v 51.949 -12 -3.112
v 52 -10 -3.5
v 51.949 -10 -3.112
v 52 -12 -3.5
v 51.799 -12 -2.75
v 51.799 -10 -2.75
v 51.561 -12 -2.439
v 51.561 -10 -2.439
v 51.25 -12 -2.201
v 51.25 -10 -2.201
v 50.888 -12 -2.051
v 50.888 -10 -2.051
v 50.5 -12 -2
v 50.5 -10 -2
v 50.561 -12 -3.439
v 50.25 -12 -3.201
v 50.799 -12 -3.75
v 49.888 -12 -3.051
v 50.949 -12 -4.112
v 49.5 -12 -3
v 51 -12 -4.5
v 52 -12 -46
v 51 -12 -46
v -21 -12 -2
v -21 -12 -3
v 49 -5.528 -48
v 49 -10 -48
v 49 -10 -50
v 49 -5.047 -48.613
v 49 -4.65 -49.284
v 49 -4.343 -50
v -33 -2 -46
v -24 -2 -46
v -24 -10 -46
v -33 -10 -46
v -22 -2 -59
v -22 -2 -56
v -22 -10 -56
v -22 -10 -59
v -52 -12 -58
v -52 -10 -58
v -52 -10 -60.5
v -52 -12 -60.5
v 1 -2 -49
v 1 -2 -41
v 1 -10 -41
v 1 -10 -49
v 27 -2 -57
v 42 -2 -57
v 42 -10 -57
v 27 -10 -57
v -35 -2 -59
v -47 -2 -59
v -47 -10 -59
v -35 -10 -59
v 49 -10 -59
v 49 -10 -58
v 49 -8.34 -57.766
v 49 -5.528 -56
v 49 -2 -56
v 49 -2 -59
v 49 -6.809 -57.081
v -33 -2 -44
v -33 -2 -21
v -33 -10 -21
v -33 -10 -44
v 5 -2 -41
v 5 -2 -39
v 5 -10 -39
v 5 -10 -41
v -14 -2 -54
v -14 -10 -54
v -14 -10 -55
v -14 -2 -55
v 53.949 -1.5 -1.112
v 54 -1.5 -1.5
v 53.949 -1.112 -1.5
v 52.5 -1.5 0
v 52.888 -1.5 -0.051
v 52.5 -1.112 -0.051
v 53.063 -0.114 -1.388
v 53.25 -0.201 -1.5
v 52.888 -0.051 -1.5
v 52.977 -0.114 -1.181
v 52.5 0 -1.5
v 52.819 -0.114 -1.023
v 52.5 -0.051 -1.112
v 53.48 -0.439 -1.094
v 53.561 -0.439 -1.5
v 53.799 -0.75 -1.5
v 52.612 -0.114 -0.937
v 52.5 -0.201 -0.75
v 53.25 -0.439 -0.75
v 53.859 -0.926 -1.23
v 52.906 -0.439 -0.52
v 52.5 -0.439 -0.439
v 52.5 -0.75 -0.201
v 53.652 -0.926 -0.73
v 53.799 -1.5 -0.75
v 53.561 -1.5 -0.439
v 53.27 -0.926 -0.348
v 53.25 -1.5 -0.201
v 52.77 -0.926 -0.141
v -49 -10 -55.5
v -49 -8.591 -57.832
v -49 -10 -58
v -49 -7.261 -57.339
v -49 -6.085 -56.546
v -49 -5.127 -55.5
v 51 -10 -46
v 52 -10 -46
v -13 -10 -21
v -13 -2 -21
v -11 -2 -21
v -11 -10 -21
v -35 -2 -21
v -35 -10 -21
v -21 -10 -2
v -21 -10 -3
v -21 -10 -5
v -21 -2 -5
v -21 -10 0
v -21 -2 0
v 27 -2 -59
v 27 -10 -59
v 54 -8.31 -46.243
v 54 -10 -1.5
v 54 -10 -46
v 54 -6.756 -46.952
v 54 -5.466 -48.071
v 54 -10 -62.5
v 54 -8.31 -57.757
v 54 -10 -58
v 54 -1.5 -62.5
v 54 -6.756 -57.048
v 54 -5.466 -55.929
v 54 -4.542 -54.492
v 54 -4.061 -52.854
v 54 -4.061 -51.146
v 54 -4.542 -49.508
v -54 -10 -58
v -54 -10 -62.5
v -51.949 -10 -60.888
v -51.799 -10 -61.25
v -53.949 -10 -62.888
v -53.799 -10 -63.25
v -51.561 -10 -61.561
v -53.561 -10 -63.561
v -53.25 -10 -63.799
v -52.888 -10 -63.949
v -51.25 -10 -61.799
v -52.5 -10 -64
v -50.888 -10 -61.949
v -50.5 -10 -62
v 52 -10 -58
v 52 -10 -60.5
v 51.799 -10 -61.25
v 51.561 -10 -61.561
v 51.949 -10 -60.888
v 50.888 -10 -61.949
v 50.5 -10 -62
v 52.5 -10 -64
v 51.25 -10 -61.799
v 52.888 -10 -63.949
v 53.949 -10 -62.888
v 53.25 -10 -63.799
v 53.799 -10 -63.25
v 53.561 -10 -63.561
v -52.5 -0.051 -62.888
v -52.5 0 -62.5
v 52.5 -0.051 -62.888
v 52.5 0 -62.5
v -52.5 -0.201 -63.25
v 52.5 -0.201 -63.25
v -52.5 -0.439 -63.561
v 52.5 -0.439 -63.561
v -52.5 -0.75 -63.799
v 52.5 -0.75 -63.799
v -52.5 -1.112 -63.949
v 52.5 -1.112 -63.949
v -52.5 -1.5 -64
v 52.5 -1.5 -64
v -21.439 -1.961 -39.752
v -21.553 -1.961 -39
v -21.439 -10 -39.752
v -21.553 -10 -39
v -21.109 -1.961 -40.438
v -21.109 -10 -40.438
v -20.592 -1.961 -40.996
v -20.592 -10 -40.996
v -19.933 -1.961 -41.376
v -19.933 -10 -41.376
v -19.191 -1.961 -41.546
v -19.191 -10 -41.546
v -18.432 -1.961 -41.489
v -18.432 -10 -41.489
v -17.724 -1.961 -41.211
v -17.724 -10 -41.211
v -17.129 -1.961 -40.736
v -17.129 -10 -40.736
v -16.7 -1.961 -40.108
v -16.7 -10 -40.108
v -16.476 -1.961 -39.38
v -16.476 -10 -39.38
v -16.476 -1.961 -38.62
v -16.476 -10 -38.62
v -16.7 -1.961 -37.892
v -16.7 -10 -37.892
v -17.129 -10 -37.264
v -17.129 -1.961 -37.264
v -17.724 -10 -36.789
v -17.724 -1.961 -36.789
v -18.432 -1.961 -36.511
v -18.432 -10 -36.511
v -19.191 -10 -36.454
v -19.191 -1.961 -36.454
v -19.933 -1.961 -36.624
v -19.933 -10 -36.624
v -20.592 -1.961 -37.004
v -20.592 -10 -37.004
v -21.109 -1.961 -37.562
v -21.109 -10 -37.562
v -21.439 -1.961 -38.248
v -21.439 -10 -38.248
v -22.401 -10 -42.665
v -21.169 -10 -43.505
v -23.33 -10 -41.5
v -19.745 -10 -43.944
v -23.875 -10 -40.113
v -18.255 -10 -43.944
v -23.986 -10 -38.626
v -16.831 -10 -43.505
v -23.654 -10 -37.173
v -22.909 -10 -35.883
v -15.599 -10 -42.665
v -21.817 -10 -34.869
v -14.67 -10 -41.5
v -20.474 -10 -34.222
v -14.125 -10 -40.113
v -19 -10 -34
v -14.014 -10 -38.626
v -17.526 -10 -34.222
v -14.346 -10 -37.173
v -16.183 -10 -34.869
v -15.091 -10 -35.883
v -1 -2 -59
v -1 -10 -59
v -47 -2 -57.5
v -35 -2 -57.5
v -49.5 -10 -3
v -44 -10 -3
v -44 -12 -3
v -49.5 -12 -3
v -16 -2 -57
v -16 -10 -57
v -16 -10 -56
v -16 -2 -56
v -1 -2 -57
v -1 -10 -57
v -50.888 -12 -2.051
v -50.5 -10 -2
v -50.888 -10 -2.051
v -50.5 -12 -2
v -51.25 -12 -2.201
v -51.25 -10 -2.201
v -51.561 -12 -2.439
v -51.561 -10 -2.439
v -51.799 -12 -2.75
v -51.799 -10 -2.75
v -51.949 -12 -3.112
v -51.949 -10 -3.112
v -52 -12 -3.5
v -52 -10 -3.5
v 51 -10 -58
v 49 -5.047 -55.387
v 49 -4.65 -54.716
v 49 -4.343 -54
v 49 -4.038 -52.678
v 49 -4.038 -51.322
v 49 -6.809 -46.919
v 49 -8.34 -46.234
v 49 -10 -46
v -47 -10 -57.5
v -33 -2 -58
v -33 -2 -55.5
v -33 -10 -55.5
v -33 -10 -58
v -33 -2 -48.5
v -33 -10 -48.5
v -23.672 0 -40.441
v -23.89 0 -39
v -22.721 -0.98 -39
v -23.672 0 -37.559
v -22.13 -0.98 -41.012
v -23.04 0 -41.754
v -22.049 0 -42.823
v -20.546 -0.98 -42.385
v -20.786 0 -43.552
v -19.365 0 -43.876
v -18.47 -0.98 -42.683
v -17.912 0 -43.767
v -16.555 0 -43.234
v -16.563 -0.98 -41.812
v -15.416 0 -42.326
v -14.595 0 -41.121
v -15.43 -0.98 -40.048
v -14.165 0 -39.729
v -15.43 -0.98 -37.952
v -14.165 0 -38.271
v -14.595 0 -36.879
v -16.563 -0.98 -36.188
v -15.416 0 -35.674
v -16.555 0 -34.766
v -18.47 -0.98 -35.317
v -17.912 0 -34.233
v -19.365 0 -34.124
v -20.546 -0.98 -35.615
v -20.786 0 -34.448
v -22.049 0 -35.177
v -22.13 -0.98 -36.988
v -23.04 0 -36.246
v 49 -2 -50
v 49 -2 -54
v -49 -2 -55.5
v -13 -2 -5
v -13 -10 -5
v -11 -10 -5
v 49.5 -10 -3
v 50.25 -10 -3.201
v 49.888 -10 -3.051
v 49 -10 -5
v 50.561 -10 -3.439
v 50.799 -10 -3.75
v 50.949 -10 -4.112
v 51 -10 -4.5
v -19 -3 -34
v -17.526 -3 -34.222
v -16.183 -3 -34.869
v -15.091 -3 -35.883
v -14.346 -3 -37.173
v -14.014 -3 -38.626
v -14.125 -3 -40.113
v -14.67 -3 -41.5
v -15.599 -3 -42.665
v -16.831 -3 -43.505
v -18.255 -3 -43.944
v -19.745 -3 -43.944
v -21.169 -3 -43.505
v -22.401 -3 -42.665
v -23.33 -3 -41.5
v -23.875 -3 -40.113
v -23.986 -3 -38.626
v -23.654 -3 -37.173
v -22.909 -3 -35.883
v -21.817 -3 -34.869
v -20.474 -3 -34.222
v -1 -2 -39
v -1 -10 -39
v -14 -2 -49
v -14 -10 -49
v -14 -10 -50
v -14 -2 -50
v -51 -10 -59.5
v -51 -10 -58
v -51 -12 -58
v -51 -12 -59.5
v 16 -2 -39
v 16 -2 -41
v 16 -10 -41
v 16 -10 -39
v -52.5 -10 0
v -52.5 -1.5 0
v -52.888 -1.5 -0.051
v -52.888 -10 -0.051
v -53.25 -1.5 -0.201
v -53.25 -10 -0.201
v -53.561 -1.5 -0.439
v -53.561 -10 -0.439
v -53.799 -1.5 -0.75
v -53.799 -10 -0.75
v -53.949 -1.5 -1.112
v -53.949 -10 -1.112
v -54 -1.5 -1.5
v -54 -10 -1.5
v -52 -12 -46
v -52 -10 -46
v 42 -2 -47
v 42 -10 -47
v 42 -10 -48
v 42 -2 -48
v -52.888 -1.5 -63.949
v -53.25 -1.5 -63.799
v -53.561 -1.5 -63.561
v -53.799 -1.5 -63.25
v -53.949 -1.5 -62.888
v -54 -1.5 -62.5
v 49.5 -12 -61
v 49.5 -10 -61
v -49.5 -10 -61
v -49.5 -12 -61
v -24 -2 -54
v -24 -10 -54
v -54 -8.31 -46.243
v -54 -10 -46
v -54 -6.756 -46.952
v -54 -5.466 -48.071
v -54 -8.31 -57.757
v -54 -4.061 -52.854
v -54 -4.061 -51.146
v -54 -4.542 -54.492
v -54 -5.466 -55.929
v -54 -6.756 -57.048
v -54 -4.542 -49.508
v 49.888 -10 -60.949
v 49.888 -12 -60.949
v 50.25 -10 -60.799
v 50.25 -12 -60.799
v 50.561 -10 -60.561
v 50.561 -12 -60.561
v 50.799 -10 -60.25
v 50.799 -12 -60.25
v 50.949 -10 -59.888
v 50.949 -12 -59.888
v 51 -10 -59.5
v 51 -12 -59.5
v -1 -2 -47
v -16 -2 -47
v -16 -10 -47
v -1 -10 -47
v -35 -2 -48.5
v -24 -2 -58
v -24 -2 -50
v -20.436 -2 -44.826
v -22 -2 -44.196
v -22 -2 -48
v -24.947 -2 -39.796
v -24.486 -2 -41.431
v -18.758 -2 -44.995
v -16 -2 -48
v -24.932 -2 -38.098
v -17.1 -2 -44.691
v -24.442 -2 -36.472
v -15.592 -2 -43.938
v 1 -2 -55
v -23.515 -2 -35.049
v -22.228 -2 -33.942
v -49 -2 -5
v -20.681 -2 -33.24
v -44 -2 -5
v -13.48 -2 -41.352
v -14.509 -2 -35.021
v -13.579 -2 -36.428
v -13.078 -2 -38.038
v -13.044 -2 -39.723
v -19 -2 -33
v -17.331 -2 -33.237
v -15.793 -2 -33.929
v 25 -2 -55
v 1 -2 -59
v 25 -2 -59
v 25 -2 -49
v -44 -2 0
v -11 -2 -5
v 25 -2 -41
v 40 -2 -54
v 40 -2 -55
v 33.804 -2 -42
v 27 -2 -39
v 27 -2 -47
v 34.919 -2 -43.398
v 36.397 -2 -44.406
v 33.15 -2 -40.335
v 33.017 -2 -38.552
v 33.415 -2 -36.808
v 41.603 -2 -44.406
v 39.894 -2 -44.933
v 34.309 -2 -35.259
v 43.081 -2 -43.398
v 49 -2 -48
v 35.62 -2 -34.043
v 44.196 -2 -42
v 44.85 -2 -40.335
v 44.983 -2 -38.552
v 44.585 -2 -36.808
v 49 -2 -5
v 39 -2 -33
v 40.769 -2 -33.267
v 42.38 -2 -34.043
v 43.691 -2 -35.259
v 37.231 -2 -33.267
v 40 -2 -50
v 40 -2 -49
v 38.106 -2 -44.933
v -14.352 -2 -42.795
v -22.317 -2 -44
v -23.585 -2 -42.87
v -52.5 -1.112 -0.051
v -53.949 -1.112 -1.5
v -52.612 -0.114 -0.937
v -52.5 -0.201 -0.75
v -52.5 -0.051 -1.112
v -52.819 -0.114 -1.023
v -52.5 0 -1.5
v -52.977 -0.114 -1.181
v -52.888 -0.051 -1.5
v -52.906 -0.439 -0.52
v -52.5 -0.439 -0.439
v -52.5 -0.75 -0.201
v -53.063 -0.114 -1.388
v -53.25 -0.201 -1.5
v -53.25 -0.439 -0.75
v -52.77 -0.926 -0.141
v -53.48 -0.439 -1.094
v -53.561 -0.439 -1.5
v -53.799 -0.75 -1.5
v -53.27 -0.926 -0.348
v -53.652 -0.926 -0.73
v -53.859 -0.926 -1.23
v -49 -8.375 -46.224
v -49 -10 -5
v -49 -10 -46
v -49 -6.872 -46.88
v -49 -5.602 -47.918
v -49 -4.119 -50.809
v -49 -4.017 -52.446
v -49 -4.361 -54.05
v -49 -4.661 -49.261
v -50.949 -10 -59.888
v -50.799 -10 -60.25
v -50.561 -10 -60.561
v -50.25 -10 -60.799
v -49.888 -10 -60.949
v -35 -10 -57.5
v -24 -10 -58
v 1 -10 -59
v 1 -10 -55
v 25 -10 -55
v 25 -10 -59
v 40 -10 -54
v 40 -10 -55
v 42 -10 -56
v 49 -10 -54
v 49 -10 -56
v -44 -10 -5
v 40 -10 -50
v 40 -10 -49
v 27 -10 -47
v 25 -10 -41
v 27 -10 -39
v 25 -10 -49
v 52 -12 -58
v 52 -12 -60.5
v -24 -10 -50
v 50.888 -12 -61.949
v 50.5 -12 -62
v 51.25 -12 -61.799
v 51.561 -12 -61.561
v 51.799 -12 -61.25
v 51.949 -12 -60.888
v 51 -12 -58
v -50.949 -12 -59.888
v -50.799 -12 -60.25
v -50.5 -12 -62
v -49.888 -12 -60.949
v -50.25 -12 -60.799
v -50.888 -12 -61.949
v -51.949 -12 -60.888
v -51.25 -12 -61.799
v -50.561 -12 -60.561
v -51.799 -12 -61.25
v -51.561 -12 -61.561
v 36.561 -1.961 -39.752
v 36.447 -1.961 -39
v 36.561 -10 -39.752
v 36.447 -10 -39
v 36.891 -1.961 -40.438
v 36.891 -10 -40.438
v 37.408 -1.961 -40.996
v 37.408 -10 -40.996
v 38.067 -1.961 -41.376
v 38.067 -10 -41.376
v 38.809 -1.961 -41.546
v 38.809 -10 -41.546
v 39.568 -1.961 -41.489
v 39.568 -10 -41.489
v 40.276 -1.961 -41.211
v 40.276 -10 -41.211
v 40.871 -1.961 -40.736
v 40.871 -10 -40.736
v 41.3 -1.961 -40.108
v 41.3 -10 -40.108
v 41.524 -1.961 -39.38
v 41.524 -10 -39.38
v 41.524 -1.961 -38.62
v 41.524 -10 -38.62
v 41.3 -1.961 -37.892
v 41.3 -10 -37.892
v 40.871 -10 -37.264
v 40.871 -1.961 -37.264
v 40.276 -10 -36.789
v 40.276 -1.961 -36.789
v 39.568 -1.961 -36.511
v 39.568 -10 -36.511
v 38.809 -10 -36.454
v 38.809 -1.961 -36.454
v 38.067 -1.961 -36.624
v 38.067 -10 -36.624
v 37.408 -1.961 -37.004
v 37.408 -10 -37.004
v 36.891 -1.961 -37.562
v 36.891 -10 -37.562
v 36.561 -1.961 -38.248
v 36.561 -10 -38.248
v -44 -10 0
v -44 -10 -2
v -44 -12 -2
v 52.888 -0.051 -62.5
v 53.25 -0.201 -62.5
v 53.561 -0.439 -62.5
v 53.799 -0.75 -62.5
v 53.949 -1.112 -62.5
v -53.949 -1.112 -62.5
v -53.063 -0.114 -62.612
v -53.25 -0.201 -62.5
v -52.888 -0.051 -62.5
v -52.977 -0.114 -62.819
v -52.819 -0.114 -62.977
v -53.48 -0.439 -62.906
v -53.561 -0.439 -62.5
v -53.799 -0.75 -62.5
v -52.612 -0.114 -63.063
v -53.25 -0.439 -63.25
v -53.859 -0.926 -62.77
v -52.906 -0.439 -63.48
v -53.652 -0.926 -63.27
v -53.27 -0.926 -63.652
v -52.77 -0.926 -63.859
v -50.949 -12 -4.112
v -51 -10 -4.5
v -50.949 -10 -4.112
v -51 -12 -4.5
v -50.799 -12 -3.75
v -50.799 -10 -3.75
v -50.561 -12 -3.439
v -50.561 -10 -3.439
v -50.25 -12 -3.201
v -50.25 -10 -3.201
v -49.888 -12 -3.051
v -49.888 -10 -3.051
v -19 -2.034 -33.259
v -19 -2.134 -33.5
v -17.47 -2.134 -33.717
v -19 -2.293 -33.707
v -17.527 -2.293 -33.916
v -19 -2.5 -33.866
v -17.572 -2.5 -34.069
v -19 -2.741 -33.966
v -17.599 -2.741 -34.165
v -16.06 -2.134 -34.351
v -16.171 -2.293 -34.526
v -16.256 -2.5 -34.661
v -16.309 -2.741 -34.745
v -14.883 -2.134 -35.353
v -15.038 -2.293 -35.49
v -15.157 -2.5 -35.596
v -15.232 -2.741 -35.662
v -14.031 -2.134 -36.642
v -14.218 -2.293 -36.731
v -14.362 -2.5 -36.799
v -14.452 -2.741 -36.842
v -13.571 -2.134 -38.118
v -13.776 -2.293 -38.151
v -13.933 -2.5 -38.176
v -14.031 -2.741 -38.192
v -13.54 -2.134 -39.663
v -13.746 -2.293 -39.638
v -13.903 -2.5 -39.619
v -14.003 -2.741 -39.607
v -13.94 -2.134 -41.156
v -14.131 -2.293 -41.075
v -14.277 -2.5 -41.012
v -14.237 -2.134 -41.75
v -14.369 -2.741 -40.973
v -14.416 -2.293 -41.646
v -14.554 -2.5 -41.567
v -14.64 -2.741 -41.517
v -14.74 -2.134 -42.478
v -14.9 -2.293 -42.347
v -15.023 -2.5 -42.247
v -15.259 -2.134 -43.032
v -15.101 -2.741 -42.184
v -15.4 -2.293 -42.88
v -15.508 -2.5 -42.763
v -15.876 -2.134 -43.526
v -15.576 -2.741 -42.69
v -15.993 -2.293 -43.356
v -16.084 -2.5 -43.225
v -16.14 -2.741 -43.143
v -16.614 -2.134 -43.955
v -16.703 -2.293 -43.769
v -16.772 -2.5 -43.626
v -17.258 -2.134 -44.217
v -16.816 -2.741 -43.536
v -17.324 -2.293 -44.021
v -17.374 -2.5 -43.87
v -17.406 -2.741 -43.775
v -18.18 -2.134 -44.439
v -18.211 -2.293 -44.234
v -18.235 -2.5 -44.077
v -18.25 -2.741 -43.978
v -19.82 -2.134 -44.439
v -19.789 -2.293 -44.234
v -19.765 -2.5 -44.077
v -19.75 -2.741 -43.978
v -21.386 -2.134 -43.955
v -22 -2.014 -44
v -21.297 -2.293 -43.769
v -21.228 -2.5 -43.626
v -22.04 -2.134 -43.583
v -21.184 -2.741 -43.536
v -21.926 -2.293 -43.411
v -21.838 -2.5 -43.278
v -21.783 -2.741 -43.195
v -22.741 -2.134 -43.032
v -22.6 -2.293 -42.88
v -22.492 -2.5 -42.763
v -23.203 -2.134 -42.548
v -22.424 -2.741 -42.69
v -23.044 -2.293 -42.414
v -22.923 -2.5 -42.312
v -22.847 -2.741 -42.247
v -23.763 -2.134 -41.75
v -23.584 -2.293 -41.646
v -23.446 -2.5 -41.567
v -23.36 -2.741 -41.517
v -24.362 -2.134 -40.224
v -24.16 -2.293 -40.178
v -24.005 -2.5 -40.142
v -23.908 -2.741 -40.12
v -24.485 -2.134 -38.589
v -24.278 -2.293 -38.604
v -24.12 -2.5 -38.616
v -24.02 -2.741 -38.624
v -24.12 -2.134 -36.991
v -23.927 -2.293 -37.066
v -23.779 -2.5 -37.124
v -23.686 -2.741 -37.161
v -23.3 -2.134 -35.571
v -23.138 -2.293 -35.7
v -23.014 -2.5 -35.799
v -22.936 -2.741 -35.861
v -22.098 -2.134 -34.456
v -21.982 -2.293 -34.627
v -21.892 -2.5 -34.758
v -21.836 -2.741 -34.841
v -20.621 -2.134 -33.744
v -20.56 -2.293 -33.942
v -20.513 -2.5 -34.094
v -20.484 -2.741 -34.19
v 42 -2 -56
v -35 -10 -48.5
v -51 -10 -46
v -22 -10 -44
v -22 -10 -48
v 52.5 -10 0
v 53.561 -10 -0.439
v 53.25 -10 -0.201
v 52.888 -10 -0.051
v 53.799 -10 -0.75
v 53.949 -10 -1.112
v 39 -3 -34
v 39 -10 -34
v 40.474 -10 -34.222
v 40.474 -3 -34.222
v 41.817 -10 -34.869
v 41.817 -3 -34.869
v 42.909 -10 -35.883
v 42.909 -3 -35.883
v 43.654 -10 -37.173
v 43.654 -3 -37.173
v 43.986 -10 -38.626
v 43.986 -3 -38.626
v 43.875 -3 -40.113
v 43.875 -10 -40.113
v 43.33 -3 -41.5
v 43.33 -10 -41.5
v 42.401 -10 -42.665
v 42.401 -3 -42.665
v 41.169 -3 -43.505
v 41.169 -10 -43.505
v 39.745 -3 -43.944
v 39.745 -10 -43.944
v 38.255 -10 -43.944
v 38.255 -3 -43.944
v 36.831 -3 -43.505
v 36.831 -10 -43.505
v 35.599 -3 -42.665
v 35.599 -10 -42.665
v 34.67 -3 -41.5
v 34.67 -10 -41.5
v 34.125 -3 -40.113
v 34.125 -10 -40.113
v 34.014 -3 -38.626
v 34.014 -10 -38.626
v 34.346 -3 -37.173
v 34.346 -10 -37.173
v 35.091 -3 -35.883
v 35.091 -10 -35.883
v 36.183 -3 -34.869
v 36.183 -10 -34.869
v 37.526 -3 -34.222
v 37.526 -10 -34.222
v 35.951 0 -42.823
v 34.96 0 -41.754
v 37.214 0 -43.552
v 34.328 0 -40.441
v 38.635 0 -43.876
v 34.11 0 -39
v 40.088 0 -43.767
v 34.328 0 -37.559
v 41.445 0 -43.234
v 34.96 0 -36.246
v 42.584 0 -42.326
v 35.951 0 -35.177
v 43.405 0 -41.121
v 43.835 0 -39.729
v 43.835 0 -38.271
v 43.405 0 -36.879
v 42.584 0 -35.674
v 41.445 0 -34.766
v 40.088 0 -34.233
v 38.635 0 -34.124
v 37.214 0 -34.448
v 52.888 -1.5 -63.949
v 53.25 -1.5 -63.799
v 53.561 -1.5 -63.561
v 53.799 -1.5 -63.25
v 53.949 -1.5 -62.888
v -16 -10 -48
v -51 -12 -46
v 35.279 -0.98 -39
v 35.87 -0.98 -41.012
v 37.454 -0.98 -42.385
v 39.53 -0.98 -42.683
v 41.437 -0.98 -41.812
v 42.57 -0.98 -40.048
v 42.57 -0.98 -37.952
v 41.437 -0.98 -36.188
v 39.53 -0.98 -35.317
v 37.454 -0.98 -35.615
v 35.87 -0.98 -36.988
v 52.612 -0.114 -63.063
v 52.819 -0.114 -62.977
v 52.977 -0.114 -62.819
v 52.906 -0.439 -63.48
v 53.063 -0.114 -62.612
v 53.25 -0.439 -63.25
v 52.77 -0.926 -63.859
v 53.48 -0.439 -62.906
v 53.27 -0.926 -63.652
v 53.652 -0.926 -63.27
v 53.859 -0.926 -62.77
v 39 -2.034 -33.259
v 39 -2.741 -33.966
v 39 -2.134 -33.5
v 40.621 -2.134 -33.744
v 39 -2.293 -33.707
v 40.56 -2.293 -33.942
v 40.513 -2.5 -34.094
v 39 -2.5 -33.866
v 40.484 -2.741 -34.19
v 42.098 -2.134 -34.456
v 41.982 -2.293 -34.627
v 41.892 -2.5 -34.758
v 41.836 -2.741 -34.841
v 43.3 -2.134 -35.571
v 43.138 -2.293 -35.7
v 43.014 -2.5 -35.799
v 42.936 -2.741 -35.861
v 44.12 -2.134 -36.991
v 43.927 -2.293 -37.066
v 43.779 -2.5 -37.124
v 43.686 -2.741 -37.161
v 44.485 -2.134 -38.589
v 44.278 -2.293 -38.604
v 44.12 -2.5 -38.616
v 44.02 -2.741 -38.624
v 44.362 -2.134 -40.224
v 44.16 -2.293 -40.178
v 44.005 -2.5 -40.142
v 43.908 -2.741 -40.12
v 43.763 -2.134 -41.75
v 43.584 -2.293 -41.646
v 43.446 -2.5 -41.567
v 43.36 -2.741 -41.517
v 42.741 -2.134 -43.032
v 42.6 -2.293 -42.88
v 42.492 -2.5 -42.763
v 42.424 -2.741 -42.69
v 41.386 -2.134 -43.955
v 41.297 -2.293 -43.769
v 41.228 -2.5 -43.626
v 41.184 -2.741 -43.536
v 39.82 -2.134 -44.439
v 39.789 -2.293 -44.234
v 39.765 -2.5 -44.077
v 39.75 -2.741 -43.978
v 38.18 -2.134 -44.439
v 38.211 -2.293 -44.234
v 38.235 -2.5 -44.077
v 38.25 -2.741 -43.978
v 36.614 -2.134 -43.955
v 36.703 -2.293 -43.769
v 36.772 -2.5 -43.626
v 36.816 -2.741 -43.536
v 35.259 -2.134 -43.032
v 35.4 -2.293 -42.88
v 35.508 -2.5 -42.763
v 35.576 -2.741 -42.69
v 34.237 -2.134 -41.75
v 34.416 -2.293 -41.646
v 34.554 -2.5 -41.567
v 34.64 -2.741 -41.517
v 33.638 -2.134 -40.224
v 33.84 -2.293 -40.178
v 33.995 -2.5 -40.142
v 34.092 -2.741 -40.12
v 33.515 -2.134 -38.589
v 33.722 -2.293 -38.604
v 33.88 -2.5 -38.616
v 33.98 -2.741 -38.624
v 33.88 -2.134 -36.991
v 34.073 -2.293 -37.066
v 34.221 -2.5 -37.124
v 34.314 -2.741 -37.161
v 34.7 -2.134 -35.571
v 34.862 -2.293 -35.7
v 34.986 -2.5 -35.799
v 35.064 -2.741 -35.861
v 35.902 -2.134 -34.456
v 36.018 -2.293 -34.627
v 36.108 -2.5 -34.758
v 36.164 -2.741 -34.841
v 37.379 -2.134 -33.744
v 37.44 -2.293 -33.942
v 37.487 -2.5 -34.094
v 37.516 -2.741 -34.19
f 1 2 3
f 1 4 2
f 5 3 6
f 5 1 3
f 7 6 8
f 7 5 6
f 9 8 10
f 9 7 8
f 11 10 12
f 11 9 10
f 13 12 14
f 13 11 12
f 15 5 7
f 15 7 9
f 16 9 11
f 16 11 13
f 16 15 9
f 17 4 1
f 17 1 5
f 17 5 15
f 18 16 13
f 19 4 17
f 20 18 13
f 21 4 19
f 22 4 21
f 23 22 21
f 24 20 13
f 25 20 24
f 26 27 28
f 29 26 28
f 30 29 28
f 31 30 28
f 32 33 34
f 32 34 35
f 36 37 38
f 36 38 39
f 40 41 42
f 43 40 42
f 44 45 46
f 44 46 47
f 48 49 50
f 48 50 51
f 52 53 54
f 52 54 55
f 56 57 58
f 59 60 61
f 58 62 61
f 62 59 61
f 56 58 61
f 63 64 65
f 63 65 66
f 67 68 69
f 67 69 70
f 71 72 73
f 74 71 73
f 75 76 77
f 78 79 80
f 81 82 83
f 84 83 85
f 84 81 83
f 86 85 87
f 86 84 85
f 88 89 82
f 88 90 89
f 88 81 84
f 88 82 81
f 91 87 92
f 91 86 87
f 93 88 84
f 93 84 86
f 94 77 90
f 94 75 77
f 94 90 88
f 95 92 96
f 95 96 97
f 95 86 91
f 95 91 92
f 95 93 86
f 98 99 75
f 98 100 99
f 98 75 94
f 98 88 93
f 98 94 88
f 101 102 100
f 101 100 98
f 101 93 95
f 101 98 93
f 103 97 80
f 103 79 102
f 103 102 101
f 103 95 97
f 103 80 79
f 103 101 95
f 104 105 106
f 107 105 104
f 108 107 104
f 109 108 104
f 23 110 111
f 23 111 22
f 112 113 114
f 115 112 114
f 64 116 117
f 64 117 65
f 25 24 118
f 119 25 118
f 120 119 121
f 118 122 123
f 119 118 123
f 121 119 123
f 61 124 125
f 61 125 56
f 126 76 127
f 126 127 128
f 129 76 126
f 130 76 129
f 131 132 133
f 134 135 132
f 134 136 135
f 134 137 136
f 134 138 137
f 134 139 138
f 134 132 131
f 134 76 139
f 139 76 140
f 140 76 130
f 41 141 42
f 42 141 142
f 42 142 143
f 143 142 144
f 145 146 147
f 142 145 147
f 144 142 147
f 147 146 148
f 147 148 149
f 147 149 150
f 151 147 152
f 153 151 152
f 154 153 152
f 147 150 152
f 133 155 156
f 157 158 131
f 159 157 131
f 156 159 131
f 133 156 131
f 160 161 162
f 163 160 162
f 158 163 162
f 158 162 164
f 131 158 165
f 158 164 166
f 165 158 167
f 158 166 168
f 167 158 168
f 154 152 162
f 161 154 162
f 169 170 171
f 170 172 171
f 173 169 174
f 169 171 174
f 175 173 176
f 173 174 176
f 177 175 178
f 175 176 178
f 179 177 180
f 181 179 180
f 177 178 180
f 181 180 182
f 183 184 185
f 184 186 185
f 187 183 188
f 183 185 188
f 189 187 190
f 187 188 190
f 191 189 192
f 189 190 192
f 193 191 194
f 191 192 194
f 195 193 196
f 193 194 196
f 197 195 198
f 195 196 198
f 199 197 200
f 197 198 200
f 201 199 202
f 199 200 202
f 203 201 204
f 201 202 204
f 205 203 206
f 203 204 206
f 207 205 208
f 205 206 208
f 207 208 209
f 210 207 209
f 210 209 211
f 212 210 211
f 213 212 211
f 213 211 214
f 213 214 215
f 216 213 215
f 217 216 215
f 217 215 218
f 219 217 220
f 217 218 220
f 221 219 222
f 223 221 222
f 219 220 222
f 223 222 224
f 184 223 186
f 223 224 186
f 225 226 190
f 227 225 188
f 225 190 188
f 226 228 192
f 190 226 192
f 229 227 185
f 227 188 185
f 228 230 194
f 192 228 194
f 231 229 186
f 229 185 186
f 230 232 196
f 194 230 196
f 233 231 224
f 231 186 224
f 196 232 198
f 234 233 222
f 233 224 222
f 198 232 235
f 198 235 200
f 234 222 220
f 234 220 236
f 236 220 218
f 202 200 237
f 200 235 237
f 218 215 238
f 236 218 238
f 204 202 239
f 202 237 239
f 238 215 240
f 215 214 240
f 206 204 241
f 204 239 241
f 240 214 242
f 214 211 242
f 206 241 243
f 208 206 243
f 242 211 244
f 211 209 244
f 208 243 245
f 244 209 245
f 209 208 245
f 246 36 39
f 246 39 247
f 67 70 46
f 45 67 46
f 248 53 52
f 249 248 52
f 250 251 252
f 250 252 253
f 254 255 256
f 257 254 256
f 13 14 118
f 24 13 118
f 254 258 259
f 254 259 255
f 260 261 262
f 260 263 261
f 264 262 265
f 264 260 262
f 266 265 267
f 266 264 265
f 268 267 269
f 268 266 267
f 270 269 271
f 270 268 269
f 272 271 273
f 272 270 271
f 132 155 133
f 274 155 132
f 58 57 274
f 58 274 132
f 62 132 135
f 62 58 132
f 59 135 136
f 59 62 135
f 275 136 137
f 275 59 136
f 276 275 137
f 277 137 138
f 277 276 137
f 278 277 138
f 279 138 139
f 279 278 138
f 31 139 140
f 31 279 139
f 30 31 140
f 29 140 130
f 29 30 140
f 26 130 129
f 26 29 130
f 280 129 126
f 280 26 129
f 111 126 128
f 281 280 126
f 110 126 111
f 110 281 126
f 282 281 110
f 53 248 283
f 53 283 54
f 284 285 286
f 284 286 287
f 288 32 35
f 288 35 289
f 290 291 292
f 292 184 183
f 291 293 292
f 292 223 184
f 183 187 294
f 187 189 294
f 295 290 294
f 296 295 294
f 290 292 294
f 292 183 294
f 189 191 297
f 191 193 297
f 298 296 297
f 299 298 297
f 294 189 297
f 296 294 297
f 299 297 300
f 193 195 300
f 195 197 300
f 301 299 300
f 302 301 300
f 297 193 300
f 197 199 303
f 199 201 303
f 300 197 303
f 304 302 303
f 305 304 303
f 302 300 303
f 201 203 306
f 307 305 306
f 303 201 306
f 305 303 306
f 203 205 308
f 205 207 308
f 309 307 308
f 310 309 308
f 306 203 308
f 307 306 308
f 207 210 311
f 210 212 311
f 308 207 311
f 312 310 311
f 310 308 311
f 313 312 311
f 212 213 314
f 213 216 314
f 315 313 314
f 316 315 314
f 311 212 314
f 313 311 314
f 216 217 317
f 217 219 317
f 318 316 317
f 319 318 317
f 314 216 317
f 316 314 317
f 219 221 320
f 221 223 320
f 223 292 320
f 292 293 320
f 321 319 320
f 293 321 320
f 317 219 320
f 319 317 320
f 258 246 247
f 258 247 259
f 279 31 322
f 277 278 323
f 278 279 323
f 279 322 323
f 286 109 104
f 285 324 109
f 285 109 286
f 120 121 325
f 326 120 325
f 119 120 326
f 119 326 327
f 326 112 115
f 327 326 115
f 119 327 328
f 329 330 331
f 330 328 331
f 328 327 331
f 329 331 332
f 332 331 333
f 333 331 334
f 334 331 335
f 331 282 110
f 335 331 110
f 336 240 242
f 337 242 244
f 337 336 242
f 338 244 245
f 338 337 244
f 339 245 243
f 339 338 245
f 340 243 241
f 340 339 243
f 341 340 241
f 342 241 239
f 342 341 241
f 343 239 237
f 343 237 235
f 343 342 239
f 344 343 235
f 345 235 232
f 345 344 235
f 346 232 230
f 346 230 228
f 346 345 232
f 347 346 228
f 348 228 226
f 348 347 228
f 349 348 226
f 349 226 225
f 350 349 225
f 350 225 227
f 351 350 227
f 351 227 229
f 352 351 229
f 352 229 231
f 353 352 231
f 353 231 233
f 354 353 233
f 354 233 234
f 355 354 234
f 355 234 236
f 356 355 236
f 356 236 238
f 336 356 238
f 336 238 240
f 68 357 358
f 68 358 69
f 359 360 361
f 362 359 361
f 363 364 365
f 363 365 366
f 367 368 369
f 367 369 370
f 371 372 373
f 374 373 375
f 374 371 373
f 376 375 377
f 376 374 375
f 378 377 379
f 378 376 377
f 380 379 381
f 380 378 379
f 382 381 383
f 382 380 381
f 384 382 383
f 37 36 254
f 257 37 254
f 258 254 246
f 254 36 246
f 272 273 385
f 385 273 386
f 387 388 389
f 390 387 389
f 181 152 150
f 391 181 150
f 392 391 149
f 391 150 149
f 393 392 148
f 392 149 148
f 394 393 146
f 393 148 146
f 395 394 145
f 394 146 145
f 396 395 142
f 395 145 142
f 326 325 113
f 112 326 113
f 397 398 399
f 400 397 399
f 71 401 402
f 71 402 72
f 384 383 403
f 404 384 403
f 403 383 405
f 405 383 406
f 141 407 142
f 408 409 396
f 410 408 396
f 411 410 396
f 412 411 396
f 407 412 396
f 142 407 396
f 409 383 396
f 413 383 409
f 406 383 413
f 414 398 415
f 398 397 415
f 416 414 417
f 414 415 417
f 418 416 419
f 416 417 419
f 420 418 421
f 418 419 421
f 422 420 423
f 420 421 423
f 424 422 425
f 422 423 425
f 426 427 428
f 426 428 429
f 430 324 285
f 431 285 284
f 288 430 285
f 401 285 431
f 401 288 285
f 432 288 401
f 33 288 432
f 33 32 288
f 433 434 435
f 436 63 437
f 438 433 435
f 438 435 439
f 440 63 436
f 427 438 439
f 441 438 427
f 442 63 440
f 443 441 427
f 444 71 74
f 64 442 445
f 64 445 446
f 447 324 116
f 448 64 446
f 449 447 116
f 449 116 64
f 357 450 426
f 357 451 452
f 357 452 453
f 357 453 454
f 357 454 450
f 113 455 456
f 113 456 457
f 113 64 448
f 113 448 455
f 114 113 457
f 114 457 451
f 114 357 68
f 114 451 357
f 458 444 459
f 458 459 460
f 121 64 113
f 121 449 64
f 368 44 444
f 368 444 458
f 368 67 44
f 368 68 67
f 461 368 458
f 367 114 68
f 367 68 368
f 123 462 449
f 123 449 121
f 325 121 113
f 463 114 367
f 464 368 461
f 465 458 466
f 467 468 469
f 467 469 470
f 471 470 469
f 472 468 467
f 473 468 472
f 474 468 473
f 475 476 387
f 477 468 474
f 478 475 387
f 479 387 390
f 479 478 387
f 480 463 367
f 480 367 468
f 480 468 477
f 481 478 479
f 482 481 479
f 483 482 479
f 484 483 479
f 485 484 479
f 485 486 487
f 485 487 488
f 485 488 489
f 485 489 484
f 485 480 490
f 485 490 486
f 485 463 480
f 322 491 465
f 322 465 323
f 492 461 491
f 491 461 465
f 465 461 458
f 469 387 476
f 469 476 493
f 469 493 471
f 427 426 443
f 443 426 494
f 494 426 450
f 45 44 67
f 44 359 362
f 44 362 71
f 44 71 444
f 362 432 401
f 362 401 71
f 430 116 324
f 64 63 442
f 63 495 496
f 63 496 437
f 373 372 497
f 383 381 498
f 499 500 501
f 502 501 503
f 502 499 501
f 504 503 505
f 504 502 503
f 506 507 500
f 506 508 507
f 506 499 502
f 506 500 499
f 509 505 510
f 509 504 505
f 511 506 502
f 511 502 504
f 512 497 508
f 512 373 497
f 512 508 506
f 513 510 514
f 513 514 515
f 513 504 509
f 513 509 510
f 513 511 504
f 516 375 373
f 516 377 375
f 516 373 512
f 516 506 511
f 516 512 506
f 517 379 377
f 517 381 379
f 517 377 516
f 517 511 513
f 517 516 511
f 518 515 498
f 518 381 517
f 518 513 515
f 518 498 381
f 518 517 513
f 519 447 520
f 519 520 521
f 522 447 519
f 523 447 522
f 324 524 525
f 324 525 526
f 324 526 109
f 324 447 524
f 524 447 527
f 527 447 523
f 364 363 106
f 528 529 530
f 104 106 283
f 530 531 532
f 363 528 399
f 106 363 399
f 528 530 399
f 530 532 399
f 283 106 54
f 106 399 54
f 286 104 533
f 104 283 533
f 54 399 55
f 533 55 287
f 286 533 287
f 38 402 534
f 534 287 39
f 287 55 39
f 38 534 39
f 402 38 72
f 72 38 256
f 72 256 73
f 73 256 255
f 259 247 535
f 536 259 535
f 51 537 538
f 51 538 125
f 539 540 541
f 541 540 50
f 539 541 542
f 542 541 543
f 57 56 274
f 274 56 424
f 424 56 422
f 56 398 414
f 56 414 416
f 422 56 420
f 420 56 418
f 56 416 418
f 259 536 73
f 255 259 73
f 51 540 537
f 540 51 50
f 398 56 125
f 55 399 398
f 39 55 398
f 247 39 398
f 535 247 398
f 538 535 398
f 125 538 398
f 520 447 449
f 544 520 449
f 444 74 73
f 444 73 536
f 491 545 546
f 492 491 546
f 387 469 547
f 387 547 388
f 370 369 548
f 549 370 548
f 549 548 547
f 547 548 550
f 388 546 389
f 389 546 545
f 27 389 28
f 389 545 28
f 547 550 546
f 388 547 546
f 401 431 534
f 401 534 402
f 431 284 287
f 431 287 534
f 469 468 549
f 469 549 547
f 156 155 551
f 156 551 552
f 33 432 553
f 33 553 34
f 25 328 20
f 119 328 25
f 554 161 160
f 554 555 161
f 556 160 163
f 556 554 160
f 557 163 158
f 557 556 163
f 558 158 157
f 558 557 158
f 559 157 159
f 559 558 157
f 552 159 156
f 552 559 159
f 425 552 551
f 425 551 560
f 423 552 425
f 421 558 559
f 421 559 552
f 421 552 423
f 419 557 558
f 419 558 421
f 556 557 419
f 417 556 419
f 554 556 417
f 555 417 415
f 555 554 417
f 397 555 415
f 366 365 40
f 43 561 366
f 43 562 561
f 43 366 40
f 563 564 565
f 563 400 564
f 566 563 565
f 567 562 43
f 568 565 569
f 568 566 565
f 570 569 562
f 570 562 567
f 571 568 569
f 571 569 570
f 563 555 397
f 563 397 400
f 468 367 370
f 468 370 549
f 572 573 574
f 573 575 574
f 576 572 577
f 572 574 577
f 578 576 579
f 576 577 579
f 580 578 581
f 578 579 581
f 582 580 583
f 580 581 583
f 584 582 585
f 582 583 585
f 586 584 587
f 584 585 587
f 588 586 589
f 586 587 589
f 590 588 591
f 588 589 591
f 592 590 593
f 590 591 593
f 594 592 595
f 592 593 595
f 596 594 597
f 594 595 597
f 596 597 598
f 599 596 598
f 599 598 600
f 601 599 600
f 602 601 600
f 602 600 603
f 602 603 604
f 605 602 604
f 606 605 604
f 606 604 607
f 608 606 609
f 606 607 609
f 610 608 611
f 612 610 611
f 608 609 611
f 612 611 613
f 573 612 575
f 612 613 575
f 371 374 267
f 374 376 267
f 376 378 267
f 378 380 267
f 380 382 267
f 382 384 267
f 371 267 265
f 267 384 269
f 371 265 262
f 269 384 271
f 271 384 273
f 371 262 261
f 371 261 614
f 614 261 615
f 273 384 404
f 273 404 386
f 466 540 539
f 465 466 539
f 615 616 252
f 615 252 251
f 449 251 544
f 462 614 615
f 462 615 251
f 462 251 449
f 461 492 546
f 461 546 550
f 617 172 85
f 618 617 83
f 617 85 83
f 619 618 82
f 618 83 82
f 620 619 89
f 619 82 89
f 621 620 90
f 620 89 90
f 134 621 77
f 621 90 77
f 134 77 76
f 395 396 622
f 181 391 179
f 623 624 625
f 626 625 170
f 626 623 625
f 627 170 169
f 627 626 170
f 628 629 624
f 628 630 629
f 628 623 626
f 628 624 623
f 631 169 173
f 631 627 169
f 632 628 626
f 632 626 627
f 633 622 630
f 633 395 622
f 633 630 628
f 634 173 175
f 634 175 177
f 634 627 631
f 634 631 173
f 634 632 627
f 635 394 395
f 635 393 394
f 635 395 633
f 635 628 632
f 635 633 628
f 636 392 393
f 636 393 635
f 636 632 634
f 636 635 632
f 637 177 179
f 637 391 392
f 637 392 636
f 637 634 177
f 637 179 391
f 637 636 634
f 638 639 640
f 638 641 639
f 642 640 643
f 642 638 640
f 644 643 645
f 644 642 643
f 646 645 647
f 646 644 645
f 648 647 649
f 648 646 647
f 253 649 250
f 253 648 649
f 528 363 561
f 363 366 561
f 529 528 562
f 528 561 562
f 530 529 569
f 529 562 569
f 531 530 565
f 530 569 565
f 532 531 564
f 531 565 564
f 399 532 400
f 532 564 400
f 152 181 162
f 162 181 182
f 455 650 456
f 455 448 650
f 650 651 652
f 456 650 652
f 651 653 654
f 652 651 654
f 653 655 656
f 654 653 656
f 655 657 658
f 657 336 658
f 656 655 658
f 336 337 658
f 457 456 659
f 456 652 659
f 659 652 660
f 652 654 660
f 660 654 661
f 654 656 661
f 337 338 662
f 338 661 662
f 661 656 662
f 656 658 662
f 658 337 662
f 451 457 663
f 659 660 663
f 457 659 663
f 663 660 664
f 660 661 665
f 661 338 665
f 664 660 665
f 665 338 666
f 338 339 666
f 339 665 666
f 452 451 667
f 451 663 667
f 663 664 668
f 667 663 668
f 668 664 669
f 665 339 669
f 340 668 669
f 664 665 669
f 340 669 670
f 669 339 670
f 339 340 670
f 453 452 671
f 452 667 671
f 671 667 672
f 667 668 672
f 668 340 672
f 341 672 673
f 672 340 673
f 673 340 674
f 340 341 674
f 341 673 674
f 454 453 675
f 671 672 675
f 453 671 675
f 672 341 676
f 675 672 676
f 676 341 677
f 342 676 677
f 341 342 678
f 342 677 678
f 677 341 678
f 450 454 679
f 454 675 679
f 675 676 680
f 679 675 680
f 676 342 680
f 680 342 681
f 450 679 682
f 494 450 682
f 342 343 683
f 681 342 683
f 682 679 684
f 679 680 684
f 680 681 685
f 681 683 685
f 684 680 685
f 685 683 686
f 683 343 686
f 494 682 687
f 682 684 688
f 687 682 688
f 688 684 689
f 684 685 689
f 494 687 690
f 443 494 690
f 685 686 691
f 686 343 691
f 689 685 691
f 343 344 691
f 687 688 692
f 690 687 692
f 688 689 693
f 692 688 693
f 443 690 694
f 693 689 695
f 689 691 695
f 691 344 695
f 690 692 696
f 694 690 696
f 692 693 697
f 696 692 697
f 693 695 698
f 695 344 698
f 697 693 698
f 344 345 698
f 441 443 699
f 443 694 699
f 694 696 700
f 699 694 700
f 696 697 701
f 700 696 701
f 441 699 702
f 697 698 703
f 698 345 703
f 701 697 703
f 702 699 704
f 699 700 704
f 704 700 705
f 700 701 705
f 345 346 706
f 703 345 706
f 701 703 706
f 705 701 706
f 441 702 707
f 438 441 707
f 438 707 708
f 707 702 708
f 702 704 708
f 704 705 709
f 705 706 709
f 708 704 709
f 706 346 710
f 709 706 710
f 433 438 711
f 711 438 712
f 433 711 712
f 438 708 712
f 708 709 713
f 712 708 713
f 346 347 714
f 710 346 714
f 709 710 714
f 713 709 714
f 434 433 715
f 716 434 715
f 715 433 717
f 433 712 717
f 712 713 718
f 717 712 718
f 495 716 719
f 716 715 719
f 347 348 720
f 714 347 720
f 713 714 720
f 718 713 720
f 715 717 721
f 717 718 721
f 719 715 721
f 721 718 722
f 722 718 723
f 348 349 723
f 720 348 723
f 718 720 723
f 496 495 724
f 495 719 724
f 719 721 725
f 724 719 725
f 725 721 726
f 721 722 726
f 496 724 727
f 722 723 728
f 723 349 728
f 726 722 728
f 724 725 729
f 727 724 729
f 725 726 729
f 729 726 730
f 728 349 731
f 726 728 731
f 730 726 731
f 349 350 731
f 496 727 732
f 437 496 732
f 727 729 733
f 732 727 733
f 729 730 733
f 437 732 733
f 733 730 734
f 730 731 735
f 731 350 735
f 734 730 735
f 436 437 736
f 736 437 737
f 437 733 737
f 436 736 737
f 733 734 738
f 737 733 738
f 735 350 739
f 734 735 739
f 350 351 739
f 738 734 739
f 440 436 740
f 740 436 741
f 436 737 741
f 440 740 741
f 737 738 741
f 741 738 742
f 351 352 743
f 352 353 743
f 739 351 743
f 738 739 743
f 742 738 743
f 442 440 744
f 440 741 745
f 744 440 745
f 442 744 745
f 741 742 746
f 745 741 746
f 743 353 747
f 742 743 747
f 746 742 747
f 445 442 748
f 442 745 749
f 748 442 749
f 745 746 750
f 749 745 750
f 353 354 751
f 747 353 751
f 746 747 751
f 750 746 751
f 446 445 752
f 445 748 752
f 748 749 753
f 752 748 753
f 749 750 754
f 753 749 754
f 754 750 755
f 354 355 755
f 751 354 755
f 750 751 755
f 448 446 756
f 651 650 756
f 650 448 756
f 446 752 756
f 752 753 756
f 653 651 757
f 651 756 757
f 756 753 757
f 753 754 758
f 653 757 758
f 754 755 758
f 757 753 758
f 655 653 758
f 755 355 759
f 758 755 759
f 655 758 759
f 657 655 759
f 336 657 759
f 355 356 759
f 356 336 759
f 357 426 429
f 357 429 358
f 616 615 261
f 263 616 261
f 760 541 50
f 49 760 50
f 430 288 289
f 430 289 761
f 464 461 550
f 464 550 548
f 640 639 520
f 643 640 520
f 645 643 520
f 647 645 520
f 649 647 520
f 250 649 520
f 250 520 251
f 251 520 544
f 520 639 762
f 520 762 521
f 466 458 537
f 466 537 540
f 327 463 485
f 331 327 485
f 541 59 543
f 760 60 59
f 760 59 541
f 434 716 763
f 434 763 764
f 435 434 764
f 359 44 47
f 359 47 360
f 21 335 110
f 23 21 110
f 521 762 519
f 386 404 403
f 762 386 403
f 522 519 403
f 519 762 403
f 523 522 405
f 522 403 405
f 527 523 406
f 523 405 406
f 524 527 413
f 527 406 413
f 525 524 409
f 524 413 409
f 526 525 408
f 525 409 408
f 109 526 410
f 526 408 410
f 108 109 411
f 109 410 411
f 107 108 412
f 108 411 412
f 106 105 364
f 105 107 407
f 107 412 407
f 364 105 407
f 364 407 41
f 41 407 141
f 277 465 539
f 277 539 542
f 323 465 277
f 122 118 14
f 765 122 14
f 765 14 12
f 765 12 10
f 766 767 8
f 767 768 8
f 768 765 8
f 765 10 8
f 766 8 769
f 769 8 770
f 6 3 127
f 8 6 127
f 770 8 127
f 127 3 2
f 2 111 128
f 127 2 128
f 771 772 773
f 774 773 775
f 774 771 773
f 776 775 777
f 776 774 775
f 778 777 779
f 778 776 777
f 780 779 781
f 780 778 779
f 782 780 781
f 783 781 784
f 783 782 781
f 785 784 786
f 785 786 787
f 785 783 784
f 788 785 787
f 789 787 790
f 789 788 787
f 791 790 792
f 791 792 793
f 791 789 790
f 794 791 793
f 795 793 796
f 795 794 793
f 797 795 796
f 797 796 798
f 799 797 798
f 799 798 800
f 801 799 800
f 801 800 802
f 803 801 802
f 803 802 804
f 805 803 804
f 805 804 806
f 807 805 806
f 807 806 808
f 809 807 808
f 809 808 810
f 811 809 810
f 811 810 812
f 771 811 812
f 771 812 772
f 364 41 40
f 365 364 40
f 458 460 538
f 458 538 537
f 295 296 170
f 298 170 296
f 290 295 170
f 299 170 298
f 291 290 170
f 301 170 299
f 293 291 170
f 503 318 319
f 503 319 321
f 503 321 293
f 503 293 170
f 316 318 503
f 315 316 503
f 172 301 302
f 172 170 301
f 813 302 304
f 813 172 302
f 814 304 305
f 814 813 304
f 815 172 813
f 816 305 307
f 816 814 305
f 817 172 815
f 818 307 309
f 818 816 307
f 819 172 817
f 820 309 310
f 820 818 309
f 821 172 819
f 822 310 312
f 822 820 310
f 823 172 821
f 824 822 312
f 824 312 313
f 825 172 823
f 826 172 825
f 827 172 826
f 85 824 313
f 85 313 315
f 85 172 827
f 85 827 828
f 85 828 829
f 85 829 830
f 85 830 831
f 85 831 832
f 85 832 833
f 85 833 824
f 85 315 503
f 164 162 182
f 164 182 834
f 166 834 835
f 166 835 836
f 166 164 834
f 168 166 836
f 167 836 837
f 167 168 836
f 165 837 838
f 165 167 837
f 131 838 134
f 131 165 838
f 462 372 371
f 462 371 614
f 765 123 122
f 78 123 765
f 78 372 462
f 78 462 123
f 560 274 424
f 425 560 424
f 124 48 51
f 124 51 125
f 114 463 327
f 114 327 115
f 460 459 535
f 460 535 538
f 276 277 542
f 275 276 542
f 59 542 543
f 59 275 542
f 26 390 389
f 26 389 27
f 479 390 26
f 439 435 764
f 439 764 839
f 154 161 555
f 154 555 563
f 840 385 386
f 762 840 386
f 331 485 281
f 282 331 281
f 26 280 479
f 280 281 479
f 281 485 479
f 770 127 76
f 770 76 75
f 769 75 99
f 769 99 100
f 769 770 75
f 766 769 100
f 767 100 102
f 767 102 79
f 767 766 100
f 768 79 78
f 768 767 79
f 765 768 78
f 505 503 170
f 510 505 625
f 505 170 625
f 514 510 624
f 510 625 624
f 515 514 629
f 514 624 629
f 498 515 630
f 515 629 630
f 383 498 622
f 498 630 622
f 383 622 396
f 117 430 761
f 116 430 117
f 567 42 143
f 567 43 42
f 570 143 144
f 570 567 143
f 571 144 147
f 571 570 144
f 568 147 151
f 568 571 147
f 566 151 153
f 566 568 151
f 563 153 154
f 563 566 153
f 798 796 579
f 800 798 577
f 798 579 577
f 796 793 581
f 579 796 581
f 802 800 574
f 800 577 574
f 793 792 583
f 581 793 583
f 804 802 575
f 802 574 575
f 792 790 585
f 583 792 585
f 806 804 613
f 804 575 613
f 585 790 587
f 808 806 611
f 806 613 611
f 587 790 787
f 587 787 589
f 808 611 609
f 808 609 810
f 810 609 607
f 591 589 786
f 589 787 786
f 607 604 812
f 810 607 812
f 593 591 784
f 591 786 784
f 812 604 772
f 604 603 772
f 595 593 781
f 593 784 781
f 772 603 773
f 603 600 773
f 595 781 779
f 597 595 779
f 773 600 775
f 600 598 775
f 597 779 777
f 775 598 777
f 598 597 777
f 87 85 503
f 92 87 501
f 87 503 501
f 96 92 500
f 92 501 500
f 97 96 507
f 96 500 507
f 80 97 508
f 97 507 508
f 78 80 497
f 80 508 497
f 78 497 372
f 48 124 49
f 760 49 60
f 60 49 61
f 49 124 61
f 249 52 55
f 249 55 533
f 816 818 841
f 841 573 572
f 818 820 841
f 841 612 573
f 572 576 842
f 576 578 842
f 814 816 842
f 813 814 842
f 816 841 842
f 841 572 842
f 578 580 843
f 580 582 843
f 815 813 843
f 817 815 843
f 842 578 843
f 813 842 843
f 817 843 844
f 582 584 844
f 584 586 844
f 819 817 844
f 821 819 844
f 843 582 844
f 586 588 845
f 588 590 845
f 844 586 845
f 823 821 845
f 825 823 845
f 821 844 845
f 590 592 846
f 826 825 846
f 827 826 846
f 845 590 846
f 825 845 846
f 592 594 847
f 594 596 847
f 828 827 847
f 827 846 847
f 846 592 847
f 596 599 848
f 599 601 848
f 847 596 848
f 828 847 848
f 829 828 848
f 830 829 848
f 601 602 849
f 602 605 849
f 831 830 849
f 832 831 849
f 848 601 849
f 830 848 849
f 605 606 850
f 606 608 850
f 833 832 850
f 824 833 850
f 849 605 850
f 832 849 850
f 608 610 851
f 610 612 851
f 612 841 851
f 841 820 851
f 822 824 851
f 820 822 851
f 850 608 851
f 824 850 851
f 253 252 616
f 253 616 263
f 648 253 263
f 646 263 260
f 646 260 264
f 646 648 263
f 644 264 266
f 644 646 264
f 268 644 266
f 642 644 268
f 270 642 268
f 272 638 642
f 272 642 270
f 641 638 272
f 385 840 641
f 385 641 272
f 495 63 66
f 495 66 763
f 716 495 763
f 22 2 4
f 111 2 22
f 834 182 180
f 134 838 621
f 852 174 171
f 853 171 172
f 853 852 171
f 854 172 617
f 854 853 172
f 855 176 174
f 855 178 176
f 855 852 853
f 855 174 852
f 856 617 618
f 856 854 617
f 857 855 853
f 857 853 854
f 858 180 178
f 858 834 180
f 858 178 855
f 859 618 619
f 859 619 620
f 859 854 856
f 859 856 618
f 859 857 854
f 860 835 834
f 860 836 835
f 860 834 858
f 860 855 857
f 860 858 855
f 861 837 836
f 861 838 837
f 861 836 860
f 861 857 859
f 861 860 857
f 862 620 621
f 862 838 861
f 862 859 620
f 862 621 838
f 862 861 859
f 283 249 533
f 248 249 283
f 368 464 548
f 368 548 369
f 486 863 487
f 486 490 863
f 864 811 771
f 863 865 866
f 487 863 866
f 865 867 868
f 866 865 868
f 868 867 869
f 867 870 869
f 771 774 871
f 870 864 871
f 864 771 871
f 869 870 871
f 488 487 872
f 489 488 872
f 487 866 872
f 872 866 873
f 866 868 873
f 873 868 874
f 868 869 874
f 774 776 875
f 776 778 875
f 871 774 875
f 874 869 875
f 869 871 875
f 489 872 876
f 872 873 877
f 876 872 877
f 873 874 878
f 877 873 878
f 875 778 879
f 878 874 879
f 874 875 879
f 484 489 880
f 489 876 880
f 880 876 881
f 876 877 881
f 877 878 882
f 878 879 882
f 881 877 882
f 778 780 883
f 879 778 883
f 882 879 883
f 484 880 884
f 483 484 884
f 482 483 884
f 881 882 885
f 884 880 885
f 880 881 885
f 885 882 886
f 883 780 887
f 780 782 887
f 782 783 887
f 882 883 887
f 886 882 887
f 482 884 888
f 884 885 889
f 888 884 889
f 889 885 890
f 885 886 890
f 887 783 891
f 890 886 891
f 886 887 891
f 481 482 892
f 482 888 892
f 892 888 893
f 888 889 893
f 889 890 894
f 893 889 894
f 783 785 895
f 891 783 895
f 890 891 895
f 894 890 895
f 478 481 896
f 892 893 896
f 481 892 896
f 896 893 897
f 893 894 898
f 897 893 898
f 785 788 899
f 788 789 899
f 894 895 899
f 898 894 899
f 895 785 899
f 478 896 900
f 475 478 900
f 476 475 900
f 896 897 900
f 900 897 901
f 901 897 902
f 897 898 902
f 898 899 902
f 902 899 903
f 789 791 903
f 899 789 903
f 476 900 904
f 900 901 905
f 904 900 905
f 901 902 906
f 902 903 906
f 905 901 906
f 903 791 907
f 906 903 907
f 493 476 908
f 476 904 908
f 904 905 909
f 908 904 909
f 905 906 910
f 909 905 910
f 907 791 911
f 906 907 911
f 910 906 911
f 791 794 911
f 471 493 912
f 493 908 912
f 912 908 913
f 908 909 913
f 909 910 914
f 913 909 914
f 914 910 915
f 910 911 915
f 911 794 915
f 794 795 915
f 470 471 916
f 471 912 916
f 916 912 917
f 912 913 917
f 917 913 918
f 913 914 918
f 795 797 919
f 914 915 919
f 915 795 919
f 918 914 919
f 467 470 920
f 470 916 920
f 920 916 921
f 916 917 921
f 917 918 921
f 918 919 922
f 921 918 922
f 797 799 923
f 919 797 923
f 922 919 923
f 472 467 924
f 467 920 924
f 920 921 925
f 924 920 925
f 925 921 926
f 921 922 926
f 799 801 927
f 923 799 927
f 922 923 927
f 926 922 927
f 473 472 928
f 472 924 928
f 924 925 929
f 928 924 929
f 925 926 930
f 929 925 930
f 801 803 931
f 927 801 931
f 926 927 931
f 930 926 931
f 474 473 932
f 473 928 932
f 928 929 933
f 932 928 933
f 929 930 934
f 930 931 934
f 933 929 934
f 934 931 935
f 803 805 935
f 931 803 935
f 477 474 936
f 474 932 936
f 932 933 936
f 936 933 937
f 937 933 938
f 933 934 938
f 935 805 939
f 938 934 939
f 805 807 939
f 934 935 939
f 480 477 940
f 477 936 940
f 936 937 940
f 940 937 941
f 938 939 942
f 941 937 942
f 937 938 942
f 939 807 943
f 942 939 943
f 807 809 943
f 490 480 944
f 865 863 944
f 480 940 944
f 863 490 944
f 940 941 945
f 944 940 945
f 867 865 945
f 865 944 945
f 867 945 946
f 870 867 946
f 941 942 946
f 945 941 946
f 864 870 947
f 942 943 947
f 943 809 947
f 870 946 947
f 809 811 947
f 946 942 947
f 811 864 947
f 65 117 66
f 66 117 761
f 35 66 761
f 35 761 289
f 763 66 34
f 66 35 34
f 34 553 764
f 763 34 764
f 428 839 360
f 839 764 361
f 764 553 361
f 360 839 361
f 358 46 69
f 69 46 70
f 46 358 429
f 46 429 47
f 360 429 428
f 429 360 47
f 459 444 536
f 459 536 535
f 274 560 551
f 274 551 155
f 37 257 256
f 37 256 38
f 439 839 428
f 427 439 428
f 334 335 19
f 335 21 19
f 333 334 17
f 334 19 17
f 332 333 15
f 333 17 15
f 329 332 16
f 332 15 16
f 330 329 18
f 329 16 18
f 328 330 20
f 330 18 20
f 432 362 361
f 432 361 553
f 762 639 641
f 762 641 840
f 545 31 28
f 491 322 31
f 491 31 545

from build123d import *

# Parameters (mm, degrees)
BASIC_BOX_OUTLINE_W                                = 108
BASIC_BOX_OUTLINE_H                                = 64
BASIC_BOX_OUTLINE_W_2                              = 98
BASIC_BOX_OUTLINE_H_2                              = 54
SIDE_WALLS_DEPTH                                   = 10
BOTTOM_START                                       = -2
BOTTOM_WALL_OUTLINE_W                              = 98
BOTTOM_WALL_OUTLINE_H                              = 54
BOTTOM_WALL_DEPTH                                  = 2
INNER_WALLS_TO_HOLD_DEVICES_W                      = 2
INNER_WALLS_TO_HOLD_DEVICES_H                      = 16
INSIDE_WALLS_DEPTH                                 = 10
SCREW_HOLES_R                                      = 5
SCREWS_DEPTH                                       = 10
ALIGNMENT_W                                        = 104
ALIGNMENT_H                                        = 60
ALIGNMENT_W_2                                      = 102
ALIGNMENT_H_2                                      = 58
ALIGNMENT_BUMP_DEPTH                               = 2
LEFT_START                                         = -5
LEFT_HOLE_DEPTH                                    = 5
RIGHT_HOLE_DEPTH                                   = 5
SKETCH6_W                                          = 23
SKETCH6_H                                          = 10
CUT_EXTRUDE2_DEPTH                                 = 10
CSK_FOR_10_FLAT_HEAD_MACHINE_SCREW_100_D           = 5.1054
CSK_FOR_10_FLAT_HEAD_MACHINE_SCREW_100_CSINK_D     = 9.779
CSK_FOR_10_FLAT_HEAD_MACHINE_SCREW_100_CSINK_ANGLE = 100
FILLET1_R                                          = 1.5
FILLET2_R                                          = 1.5
FILLET3_R                                          = 1


# Read off the part's stored shape, not the designer's step: bottom wall
with BuildPart() as part:
    # basic box outline → side walls (new body)
    with BuildSketch(Plane(origin=(0, 0, 0), x_dir=(1, 0, 0), z_dir=(0, 1, 0))):
        with Locations((0, 32)):
            Rectangle(BASIC_BOX_OUTLINE_W, BASIC_BOX_OUTLINE_H)
        with Locations((0, 32)):
            Rectangle(BASIC_BOX_OUTLINE_W_2, BASIC_BOX_OUTLINE_H_2, mode=Mode.SUBTRACT)
    extrude(amount=-SIDE_WALLS_DEPTH)

    # bottom wall outline → bottom wall (add)
    with BuildSketch(Plane(origin=(0, 0, 0), x_dir=(1, 0, 0), z_dir=(0, 1, 0)).offset(BOTTOM_START)):
        with Locations((0, 32)):
            Rectangle(BOTTOM_WALL_OUTLINE_W, BOTTOM_WALL_OUTLINE_H)
    extrude(amount=BOTTOM_WALL_DEPTH)

    # inner walls to hold devices → inside walls (add)
    with BuildSketch(Plane(origin=(0, 0, 0), x_dir=(1, 0, 0), z_dir=(0, 1, 0))):
        Polygon((-47, 59), (-49, 59), (-49, 55.5), (-33, 55.5), (-33, 58), (-24, 58), (-24, 54), (-14, 54), (-14, 55), (1, 55), (1, 59), (-1, 59), (-1, 57), (-16, 57), (-16, 56), (-22, 56), (-22, 59), (-35, 59), (-35, 57.5), (-47, 57.5), align=None)
        Polygon((27, 59), (25, 59), (25, 55), (40, 55), (40, 54), (49, 54), (49, 56), (42, 56), (42, 57), (27, 57), align=None)
        Polygon((49, 50), (40, 50), (40, 49), (25, 49), (25, 41), (16, 41), (16, 39), (27, 39), (27, 47), (42, 47), (42, 48), (49, 48), align=None)
        Polygon((-14, 50), (-24, 50), (-24, 46), (-33, 46), (-33, 48.5), (-35, 48.5), (-35, 21), (-33, 21), (-33, 44), (-22, 44), (-22, 48), (-16, 48), (-16, 47), (-1, 47), (-1, 39), (5, 39), (5, 41), (1, 41), (1, 49), (-14, 49), align=None)
        with Locations((-12, 13)):
            Rectangle(INNER_WALLS_TO_HOLD_DEVICES_W, INNER_WALLS_TO_HOLD_DEVICES_H)
    extrude(amount=-INSIDE_WALLS_DEPTH)

    # screw holes → screws (add)
    with BuildSketch(Plane(origin=(0, 0, 0), x_dir=(1, 0, 0), z_dir=(0, 1, 0))):
        with Locations(Location((-19, 39, 0), (0, 0, 270))):
            Circle(SCREW_HOLES_R)
        with Locations(Location((39, 39, 0), (0, 0, 270))):
            Circle(SCREW_HOLES_R)
    extrude(amount=-SCREWS_DEPTH)

    # alignment → alignment bump (add)
    with BuildSketch(Plane(origin=(0, -10, 0), x_dir=(-1, 0, 0), z_dir=(0, -1, 0))):
        with Locations((0, 32)):
            Rectangle(ALIGNMENT_W, ALIGNMENT_H)
        with Locations((0, 32)):
            Rectangle(ALIGNMENT_W_2, ALIGNMENT_H_2, mode=Mode.SUBTRACT)
    extrude(amount=ALIGNMENT_BUMP_DEPTH)

    # hole 1 → left hole (cut)
    with BuildSketch(Plane(origin=(54, 0, 0), x_dir=(0, 0, -1), z_dir=(1, 0, 0)).offset(LEFT_START)):
        with BuildLine():
            Line((46, -10), (46, -12))
            Line((46, -12), (58, -12))
            Line((58, -12), (58, -10))
            ThreePointArc((58, -10), (52, -4), (46, -10))
        make_face()
    extrude(amount=LEFT_HOLE_DEPTH, mode=Mode.SUBTRACT)

    # hole 2 → right hole (cut)
    with BuildSketch(Plane.ZY.offset(54)):
        with BuildLine():
            Line((-58, -10), (-58, -12))
            Line((-58, -12), (-46, -12))
            Line((-46, -12), (-46, -10))
            ThreePointArc((-46, -10), (-52, -4), (-58, -10))
        make_face()
    extrude(amount=-RIGHT_HOLE_DEPTH, mode=Mode.SUBTRACT)

    # Sketch6 → Cut-Extrude2 (cut)
    with BuildSketch(Plane.XY):
        with Locations((-32.5, -7)):
            Rectangle(SKETCH6_W, SKETCH6_H)
    extrude(amount=-CUT_EXTRUDE2_DEPTH, mode=Mode.SUBTRACT)

    # CSK for #10 Flat Head Machine Screw (100)1 (through all)
    with Locations(Plane(origin=(0, 0, 0), x_dir=(1, 0, 0), z_dir=(0, 1, 0))):
        with Locations((-19, 39), (39, 39)):
            CounterSinkHole(CSK_FOR_10_FLAT_HEAD_MACHINE_SCREW_100_D / 2, CSK_FOR_10_FLAT_HEAD_MACHINE_SCREW_100_CSINK_D / 2, counter_sink_angle=CSK_FOR_10_FLAT_HEAD_MACHINE_SCREW_100_CSINK_ANGLE)

    # Fillet1
    fillet1_edges = [part.edges().sort_by_distance(p)[0] for p in [
        (-52, -11, -2),
        (-52, -11, -62),
        (52, -11, -62),
        (52, -11, -2),
        (-51, -11, -61),
        (51, -11, -61),
        (51, -11, -3),
        (-51, -11, -3),
        (-54, -5, -64),
        (54, -5, -64),
        (54, -5, 0),
        (-54, -5, 0),
    ]]
    fillet(fillet1_edges, radius=FILLET1_R)

    # Fillet2
    fillet2_edges = [part.edges().sort_by_distance(p)[0] for p in [
        (0, 0, -64),
        (-54, 0, -32),
        (0, 0, 0),
        (54, 0, -32),
        (-53.560660172, 0, -0.439339828),
        (53.560660172, 0, -0.439339828),
        (53.560660172, 0, -63.560660172),
        (-53.560660172, 0, -63.560660172),
    ]]
    fillet(fillet2_edges, radius=FILLET2_R)

    # Fillet3
    # the kernel refuses this fillet: 1 mm, written as the material it adds along each edge
    with BuildSketch(Plane(origin=(-19, -2, -39), x_dir=(0, 0, 1), z_dir=(-1, 0, 0))) as fillet3_piece_1:
        with BuildLine():
            CenterArc((5 + FILLET3_R, -FILLET3_R), FILLET3_R, 90, 90)
            Line((5, -FILLET3_R), (5, 0))
            Line((5, 0), (5 + FILLET3_R, 0))
        make_face()
    revolve(axis=Axis((-19, -2, -39), (0, 1, 0)))
    with BuildSketch(Plane(origin=(39, -2, -39), x_dir=(0, 0, 1), z_dir=(-1, 0, 0))) as fillet3_piece_2:
        with BuildLine():
            CenterArc((5 + FILLET3_R, -FILLET3_R), FILLET3_R, 90, 90)
            Line((5, -FILLET3_R), (5, 0))
            Line((5, 0), (5 + FILLET3_R, 0))
        make_face()
    revolve(axis=Axis((39, -2, -39), (0, 1, 0)))


solid = part.part
